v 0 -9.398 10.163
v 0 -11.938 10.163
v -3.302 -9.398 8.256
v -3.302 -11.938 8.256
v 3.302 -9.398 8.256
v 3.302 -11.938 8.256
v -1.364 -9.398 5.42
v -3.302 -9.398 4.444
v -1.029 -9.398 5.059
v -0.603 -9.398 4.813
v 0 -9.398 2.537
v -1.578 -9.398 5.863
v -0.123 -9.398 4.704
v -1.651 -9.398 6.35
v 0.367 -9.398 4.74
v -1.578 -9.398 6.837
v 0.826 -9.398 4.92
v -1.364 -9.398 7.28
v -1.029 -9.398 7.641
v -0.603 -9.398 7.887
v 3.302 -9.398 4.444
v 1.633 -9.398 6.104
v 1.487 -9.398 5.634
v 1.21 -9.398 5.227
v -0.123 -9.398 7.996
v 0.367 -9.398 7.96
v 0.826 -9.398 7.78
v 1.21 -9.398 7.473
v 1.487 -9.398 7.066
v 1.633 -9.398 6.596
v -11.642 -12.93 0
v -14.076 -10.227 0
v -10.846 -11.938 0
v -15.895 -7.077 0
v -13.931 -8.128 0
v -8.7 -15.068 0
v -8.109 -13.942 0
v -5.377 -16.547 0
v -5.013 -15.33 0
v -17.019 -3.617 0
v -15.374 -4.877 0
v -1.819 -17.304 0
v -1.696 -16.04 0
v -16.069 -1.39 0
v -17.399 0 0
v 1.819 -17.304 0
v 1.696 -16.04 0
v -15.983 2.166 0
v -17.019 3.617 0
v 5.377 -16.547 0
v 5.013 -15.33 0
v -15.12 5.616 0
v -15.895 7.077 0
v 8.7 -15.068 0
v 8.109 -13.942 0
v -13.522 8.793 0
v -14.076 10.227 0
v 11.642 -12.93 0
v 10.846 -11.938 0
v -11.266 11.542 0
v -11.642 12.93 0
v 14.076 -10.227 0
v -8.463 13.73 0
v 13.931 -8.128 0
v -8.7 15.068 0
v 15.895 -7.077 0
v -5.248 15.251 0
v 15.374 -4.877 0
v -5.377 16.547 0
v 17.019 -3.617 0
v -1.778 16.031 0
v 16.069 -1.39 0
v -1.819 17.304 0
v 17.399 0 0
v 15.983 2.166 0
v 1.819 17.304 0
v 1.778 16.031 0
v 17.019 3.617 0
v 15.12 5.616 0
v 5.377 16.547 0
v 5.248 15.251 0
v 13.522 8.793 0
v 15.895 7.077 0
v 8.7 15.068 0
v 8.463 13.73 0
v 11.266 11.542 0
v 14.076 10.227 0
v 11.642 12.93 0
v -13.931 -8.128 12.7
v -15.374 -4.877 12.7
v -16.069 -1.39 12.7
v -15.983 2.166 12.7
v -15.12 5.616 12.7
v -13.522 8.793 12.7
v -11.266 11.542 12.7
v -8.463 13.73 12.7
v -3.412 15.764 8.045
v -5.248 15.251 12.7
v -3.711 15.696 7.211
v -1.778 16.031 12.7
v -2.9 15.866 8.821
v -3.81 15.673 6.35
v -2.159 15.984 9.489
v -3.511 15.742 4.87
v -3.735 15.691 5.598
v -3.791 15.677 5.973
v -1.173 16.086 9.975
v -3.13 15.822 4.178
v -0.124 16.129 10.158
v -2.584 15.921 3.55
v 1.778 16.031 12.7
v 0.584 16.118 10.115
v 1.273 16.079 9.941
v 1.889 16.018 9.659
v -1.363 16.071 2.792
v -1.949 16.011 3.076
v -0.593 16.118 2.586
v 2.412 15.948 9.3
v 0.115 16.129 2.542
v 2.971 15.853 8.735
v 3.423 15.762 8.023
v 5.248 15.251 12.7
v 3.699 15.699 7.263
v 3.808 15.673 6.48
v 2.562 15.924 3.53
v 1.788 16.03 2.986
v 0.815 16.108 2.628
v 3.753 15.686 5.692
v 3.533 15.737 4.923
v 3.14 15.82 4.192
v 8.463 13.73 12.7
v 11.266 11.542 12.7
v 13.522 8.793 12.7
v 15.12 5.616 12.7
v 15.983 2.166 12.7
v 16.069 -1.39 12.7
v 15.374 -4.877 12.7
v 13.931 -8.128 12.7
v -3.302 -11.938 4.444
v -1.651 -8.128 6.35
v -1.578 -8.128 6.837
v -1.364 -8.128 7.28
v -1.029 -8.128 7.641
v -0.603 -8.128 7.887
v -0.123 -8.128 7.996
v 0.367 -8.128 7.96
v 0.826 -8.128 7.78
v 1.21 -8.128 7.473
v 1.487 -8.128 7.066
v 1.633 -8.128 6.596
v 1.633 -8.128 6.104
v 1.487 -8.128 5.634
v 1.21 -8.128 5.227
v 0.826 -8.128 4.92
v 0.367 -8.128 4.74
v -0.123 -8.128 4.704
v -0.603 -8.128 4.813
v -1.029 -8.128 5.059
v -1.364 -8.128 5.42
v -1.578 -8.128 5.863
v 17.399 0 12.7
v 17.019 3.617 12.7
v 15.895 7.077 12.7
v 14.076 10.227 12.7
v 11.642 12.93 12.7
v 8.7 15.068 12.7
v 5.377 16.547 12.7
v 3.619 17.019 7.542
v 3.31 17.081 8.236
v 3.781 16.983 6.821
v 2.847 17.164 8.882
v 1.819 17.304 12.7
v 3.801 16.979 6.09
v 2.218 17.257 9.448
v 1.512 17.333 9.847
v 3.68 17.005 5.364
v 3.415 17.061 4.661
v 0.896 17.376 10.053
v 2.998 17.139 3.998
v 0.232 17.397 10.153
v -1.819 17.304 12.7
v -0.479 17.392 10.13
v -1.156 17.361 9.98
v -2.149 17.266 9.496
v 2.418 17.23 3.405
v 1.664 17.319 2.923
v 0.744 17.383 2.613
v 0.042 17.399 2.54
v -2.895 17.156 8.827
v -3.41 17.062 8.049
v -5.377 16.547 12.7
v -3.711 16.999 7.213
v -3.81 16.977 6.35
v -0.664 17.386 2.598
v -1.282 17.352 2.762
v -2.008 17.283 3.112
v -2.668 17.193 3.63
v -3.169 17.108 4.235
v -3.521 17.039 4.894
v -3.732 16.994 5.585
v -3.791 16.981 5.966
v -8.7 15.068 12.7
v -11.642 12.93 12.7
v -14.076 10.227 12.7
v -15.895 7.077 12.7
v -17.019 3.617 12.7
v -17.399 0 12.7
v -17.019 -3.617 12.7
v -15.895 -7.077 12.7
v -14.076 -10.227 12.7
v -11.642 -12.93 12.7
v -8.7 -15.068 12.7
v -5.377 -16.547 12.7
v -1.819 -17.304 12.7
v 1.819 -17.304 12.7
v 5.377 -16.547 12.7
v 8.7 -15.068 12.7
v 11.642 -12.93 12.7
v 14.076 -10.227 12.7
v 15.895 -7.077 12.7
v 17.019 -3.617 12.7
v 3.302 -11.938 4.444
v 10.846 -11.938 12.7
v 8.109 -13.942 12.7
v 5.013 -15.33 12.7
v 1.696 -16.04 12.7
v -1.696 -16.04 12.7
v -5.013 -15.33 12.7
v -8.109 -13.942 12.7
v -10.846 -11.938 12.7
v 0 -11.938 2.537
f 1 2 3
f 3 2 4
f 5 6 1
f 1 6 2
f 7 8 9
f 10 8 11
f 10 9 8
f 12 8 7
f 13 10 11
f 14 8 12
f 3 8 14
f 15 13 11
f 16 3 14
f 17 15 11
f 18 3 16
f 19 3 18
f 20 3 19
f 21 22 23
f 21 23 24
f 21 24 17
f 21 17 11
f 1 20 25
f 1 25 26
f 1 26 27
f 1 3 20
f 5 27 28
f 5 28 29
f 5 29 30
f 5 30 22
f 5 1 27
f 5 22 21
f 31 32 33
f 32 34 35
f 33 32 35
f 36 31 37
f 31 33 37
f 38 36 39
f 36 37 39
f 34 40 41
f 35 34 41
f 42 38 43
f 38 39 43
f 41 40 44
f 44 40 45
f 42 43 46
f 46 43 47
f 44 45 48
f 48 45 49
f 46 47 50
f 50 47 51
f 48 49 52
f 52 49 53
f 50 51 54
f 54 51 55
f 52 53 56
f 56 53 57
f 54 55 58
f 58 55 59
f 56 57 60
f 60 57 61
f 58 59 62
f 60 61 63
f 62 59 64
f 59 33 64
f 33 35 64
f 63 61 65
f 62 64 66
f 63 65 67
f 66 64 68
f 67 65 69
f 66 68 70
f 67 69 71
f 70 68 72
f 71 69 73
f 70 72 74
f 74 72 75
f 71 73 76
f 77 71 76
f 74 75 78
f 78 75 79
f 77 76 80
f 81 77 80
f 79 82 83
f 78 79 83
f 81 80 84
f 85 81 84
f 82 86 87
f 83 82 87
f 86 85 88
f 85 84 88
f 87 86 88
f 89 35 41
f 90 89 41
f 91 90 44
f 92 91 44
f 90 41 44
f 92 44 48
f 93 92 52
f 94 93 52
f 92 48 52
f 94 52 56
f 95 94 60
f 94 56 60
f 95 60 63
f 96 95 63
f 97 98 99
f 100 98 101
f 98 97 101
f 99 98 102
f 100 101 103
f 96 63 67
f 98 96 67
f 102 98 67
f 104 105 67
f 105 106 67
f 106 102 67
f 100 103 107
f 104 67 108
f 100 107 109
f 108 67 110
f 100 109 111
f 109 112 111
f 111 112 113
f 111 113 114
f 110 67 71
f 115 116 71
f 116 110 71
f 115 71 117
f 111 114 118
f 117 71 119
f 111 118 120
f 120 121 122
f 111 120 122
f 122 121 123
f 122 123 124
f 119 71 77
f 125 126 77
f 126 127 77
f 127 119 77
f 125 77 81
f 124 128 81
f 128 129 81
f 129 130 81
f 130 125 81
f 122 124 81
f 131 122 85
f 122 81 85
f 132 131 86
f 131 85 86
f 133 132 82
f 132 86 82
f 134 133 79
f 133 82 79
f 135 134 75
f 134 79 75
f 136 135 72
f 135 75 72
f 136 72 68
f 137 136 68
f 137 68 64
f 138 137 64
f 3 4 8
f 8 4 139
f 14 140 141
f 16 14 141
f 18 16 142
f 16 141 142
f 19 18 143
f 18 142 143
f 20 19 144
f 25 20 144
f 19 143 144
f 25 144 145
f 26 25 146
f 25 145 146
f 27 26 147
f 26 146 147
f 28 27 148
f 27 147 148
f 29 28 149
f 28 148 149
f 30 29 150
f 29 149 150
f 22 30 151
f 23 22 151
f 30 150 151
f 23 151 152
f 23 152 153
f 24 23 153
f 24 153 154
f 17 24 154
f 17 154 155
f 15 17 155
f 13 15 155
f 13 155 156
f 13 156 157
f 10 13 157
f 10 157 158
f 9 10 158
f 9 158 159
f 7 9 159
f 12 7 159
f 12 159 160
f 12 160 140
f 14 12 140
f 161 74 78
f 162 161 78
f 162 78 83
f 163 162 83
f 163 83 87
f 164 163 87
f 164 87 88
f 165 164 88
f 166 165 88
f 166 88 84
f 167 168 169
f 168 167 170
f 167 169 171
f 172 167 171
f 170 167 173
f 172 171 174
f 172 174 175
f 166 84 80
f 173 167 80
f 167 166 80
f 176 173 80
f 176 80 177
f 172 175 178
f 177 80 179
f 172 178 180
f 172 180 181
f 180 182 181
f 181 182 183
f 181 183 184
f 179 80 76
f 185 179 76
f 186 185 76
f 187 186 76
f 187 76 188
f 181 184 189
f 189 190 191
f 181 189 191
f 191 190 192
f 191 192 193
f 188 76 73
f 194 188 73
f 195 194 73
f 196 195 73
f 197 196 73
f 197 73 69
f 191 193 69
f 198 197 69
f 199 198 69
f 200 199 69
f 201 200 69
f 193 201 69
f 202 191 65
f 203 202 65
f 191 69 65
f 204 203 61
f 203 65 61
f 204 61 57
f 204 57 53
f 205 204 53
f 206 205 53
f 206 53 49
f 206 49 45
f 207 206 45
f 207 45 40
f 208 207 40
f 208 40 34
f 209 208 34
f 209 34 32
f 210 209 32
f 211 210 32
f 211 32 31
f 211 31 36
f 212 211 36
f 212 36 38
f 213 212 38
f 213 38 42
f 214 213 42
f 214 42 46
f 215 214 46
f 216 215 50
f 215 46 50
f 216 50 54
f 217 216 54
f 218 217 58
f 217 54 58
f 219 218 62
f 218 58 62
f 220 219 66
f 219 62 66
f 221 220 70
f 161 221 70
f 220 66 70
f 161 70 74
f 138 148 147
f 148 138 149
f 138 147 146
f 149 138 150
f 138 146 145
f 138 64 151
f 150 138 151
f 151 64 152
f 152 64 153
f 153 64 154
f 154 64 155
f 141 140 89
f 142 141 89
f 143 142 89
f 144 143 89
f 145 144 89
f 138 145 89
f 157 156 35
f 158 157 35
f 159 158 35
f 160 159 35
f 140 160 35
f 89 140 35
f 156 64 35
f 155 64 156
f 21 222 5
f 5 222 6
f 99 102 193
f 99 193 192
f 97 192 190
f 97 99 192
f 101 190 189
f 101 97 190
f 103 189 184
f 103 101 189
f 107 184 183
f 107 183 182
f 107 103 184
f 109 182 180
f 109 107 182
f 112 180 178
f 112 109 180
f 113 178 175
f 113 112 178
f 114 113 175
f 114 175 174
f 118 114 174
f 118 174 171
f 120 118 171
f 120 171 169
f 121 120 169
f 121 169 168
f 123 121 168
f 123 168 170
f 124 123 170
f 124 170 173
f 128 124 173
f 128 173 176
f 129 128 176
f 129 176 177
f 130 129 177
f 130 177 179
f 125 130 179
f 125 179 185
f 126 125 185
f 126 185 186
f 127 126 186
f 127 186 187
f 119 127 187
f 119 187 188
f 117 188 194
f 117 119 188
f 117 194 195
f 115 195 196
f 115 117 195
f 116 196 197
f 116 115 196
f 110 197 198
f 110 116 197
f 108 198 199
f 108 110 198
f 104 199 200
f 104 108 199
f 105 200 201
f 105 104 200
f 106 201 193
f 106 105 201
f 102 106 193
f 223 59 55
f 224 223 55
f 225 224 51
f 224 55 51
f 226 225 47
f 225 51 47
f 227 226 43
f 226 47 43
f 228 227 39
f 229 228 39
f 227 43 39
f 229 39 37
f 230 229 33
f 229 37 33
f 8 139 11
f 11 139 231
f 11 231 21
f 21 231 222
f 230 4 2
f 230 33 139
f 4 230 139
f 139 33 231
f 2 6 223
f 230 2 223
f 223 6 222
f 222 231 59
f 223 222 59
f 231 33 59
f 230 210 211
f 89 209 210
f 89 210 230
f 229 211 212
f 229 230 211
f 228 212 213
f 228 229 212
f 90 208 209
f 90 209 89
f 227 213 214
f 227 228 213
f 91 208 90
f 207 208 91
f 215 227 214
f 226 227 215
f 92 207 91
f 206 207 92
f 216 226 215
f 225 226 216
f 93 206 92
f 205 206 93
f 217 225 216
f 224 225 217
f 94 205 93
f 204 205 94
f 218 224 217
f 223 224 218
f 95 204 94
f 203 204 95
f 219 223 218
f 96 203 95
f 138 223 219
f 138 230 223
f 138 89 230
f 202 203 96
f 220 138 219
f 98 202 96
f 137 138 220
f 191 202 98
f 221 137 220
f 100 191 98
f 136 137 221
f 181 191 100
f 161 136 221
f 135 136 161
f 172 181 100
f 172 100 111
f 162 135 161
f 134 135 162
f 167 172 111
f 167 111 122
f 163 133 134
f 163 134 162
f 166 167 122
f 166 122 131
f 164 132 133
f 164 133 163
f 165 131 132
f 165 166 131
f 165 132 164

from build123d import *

# Parameters (mm, degrees)
F0_R     = 17.399
F1_DEPTH = 12.7
F2_R     = 1.651
F3_DEPTH = 3.81
F5_DEPTH = 2.54
F6_R     = 3.81
F7_DEPTH = 25.528


with BuildPart() as f1:
    # F0 (on Top) → F1 (new body)
    with BuildSketch(Plane.XY):
        Circle(F0_R)
        with BuildLine():
            ThreePointArc((10.845681, -11.938), (0, -16.129), (-10.845681, -11.938))
            Line((-10.845681, -11.938), (10.845681, -11.938))
        make_face(mode=Mode.SUBTRACT)
        with BuildLine():
            Line((13.931269, -8.128), (-13.931269, -8.128))
            ThreePointArc((-13.931269, -8.128), (0, 16.129), (13.931269, -8.128))
        make_face(mode=Mode.SUBTRACT)
    extrude(amount=F1_DEPTH)

    # F2 (on face) → F3 (cut, through all)
    with BuildSketch(Plane(origin=(0, -8.128, 0), x_dir=(-1, 0, 0), z_dir=(0, 1, 0))):
        with Locations((0, 6.35)):
            Circle(F2_R)
    extrude(amount=-F3_DEPTH, mode=Mode.SUBTRACT)

    # F4 (on face) → F5 (cut)
    with BuildSketch(Plane.XZ.offset(11.938)):
        Polygon((3.302, 4.443589), (3.302, 8.256411), (0, 10.162821), (-3.302, 8.256411), (-3.302, 4.443589), (0, 2.537179), align=None)
    extrude(amount=-F5_DEPTH, mode=Mode.SUBTRACT)

    # F6 (on face) → F7 (cut, through all)
    with BuildSketch(Plane(origin=(0, -8.128, 0), x_dir=(-1, 0, 0), z_dir=(0, 1, 0))):
        with Locations((0, 6.35)):
            Circle(F6_R)
    extrude(amount=F7_DEPTH, mode=Mode.SUBTRACT)


solid = f1.part
